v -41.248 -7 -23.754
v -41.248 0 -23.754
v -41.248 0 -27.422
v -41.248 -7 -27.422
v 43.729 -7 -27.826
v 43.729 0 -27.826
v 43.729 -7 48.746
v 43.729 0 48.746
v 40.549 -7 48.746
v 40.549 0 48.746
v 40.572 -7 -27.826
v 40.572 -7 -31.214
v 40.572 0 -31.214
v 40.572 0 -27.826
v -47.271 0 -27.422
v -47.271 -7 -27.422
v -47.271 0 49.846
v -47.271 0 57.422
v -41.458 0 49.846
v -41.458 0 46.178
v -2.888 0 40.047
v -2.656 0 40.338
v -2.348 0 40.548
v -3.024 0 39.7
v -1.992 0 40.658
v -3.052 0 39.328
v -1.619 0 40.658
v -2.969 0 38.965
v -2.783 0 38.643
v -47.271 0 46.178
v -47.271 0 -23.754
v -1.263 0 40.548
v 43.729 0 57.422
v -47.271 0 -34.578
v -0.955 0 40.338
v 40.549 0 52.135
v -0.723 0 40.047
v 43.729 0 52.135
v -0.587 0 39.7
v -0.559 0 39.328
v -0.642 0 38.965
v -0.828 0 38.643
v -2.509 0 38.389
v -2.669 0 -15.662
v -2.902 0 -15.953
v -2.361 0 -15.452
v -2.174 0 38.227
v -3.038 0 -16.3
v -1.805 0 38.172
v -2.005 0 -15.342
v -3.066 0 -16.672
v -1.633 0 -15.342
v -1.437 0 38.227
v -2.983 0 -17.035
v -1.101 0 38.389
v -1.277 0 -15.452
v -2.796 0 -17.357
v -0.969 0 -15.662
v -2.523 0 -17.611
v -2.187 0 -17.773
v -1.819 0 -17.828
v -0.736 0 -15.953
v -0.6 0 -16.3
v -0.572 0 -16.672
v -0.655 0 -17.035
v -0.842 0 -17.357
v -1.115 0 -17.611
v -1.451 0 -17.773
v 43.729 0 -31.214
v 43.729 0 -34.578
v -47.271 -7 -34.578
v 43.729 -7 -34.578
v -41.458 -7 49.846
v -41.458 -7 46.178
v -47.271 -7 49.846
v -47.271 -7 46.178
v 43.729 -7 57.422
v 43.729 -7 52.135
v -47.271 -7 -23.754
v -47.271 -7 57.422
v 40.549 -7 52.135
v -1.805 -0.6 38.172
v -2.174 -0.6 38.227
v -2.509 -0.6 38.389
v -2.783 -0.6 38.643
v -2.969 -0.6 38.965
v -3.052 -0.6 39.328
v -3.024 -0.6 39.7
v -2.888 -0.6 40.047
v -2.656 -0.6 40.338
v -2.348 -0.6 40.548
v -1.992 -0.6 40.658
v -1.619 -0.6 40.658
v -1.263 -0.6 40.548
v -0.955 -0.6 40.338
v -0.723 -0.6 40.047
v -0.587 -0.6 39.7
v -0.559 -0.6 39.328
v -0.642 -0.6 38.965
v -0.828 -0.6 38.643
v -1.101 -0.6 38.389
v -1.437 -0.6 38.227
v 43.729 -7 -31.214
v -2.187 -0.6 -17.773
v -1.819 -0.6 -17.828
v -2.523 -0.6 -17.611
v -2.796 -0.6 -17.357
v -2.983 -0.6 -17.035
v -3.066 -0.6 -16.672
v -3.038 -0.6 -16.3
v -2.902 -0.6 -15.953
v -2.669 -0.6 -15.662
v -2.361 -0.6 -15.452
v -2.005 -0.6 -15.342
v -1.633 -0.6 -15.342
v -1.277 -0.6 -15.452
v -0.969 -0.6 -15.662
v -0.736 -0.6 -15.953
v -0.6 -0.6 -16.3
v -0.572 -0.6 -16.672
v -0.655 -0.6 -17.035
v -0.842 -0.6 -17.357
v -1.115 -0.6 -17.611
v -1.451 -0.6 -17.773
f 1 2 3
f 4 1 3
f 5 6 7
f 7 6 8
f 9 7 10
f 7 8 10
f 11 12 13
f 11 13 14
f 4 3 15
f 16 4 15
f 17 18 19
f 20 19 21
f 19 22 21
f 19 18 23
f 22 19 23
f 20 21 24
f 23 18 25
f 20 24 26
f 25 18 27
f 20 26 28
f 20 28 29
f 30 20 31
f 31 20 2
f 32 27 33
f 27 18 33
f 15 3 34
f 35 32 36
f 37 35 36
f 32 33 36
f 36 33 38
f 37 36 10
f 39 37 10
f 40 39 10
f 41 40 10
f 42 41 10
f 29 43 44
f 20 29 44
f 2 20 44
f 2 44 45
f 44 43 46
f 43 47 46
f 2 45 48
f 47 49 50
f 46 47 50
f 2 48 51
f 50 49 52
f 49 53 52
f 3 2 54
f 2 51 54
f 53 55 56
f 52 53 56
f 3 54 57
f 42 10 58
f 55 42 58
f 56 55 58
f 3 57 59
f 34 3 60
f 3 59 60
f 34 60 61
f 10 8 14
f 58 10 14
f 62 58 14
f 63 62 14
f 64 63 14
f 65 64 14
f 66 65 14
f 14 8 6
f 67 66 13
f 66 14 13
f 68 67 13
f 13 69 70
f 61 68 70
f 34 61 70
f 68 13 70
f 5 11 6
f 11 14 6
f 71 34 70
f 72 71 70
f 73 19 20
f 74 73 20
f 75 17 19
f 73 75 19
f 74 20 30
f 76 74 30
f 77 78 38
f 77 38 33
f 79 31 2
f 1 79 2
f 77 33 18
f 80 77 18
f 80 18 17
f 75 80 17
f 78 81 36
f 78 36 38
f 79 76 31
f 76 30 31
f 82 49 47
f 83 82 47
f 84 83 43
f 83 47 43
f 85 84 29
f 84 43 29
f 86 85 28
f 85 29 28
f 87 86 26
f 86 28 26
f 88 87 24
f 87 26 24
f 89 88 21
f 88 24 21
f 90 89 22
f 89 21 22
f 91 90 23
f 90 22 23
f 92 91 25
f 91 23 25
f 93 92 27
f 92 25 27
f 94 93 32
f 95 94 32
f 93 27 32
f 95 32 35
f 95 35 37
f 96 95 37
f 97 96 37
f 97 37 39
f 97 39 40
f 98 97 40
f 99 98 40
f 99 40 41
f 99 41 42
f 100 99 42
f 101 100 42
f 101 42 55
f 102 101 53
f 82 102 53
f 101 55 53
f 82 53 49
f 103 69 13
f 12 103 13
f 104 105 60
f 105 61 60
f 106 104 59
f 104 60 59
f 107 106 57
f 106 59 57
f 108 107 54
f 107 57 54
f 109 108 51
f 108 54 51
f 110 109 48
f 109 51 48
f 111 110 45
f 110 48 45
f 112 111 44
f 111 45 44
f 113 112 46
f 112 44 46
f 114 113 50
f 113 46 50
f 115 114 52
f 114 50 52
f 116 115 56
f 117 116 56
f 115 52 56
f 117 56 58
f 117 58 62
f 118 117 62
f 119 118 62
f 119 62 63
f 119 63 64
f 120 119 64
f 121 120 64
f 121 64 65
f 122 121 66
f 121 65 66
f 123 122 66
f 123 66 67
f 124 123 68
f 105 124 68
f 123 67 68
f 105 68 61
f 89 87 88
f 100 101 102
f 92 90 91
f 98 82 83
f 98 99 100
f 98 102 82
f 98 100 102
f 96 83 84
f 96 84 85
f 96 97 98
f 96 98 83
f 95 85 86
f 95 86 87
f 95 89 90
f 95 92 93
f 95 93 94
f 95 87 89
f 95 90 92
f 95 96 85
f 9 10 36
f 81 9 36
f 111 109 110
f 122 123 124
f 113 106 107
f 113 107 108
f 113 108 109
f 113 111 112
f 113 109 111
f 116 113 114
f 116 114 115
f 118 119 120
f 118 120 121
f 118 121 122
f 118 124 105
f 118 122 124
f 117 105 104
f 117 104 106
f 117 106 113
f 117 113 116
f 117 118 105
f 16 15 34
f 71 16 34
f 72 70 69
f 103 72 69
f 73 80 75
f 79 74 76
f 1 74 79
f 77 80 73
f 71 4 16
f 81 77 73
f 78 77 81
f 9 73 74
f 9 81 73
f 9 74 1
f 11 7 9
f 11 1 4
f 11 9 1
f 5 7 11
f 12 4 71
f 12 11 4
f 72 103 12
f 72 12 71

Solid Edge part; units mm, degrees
sketch "Sketch1" plane through (0.5445, 0, 7.8115) normal (0, -1, 0) x (1, 0, 0)
  line L0 (-47.8158, -42.3896) -> (43.1842, -42.3896)
  line L1 (43.1842, -42.3896) -> (43.1842, 49.6104)
  line L2 (43.1842, 49.6104) -> (-47.8158, 49.6104)
  line L3 (-47.8158, 49.6104) -> (-47.8158, -42.3896)
  dimension "D1" = 92
  dimension "D2" = 91
extrude "ExtrudedProtrusion_1" add sketch "Sketch1" along normal blind 7
sketch "Sketch2" plane through (0, -7, 0) normal (0, -1, 0) x (1, 0, 0)
  circle A0 centre (-43.2212, -25.5881) radius 1.59
  circle A1 centre (42.2588, 50.4519) radius 1.59
  circle A2 centre (42.2888, -29.5381) radius 1.59
  circle A3 centre (-43.5212, 48.0119) radius 1.59
  dimension "D1" = 3.18
  dimension "D2" = 3.18
  dimension "D3" = 3.18
extrude "Cutout1" cut sketch "Sketch2" against normal up to next
sketch "Sketch3" plane through (-1.7712, 0, 11.4219) normal (0, 1, 0) x (0, 0, -1)
  circle A0 centre (-28, 0.0341) radius 1.25
  circle A1 centre (28, 0.0478) radius 1.25
  dimension "D1" = 18
  dimension "D2" = 18
extrude "ExtrudedCutout_2" cut sketch "Sketch3" against normal blind 0.6 and the other way blind 0.5701
sketch "Sketch4" plane through (-1.7712, -7, 11.4219) normal (0, -1, 0) x (0, 0, 1)
  line L0 (-41.5248, -45.6542) -> (-42.6363, -45.6542)
  line L1 (-42.6363, -45.6542) -> (-42.6363, -42.3427)
  line L2 (-42.6363, -42.3427) -> (-39.2477, -42.3427)
  line L3 (-39.2477, -42.3427) -> (-39.2477, -45.6542)
  line L4 (-39.2477, -45.6542) -> (-41.5248, -45.6542)
extrude "ExtrudedCutout_3" cut sketch "Sketch4" along normal mid plane 21.8281
sketch "Sketch5" plane through (-1.7712, -7, 11.4219) normal (0, -1, 0) x (0, 0, 1)
  line L0 (38.4357, -45.6314) -> (37.3242, -45.6314)
  line L1 (37.3242, -45.6314) -> (37.3242, -42.3199)
  line L2 (37.3242, -42.3199) -> (40.7128, -42.3199)
  line L3 (40.7128, -42.3199) -> (40.7128, -45.6314)
  line L4 (40.7128, -45.6314) -> (38.4357, -45.6314)
extrude "ExtrudedCutout_4" cut sketch "Sketch5" along normal mid plane 18.958
sketch "Sketch6" plane through (-1.7712, -7, 11.4219) normal (0, -1, 0) x (1, 0, 0)
  line L0 (-44.6317, -38.8436) -> (-45.7431, -38.8436)
  line L1 (-45.7431, -38.8436) -> (-45.7431, -35.1764)
  line L2 (-45.7431, -35.1764) -> (-39.4763, -35.1764)
  line L3 (-39.4763, -35.1764) -> (-39.4763, -38.8436)
  line L4 (-39.4763, -38.8436) -> (-44.6317, -38.8436)
  line L5 (-44.842, 34.7564) -> (-45.9535, 34.7564)
  line L6 (-45.9535, 34.7564) -> (-45.9535, 38.4236)
  line L7 (-45.9535, 38.4236) -> (-39.6867, 38.4236)
  line L8 (-39.6867, 38.4236) -> (-39.6867, 34.7564)
  line L9 (-39.6867, 34.7564) -> (-44.842, 34.7564)
extrude "ExtrudedCutout_5" cut sketch "Sketch6" along normal mid plane 46.9904
properties material "ABS Plastic, medium impact"
